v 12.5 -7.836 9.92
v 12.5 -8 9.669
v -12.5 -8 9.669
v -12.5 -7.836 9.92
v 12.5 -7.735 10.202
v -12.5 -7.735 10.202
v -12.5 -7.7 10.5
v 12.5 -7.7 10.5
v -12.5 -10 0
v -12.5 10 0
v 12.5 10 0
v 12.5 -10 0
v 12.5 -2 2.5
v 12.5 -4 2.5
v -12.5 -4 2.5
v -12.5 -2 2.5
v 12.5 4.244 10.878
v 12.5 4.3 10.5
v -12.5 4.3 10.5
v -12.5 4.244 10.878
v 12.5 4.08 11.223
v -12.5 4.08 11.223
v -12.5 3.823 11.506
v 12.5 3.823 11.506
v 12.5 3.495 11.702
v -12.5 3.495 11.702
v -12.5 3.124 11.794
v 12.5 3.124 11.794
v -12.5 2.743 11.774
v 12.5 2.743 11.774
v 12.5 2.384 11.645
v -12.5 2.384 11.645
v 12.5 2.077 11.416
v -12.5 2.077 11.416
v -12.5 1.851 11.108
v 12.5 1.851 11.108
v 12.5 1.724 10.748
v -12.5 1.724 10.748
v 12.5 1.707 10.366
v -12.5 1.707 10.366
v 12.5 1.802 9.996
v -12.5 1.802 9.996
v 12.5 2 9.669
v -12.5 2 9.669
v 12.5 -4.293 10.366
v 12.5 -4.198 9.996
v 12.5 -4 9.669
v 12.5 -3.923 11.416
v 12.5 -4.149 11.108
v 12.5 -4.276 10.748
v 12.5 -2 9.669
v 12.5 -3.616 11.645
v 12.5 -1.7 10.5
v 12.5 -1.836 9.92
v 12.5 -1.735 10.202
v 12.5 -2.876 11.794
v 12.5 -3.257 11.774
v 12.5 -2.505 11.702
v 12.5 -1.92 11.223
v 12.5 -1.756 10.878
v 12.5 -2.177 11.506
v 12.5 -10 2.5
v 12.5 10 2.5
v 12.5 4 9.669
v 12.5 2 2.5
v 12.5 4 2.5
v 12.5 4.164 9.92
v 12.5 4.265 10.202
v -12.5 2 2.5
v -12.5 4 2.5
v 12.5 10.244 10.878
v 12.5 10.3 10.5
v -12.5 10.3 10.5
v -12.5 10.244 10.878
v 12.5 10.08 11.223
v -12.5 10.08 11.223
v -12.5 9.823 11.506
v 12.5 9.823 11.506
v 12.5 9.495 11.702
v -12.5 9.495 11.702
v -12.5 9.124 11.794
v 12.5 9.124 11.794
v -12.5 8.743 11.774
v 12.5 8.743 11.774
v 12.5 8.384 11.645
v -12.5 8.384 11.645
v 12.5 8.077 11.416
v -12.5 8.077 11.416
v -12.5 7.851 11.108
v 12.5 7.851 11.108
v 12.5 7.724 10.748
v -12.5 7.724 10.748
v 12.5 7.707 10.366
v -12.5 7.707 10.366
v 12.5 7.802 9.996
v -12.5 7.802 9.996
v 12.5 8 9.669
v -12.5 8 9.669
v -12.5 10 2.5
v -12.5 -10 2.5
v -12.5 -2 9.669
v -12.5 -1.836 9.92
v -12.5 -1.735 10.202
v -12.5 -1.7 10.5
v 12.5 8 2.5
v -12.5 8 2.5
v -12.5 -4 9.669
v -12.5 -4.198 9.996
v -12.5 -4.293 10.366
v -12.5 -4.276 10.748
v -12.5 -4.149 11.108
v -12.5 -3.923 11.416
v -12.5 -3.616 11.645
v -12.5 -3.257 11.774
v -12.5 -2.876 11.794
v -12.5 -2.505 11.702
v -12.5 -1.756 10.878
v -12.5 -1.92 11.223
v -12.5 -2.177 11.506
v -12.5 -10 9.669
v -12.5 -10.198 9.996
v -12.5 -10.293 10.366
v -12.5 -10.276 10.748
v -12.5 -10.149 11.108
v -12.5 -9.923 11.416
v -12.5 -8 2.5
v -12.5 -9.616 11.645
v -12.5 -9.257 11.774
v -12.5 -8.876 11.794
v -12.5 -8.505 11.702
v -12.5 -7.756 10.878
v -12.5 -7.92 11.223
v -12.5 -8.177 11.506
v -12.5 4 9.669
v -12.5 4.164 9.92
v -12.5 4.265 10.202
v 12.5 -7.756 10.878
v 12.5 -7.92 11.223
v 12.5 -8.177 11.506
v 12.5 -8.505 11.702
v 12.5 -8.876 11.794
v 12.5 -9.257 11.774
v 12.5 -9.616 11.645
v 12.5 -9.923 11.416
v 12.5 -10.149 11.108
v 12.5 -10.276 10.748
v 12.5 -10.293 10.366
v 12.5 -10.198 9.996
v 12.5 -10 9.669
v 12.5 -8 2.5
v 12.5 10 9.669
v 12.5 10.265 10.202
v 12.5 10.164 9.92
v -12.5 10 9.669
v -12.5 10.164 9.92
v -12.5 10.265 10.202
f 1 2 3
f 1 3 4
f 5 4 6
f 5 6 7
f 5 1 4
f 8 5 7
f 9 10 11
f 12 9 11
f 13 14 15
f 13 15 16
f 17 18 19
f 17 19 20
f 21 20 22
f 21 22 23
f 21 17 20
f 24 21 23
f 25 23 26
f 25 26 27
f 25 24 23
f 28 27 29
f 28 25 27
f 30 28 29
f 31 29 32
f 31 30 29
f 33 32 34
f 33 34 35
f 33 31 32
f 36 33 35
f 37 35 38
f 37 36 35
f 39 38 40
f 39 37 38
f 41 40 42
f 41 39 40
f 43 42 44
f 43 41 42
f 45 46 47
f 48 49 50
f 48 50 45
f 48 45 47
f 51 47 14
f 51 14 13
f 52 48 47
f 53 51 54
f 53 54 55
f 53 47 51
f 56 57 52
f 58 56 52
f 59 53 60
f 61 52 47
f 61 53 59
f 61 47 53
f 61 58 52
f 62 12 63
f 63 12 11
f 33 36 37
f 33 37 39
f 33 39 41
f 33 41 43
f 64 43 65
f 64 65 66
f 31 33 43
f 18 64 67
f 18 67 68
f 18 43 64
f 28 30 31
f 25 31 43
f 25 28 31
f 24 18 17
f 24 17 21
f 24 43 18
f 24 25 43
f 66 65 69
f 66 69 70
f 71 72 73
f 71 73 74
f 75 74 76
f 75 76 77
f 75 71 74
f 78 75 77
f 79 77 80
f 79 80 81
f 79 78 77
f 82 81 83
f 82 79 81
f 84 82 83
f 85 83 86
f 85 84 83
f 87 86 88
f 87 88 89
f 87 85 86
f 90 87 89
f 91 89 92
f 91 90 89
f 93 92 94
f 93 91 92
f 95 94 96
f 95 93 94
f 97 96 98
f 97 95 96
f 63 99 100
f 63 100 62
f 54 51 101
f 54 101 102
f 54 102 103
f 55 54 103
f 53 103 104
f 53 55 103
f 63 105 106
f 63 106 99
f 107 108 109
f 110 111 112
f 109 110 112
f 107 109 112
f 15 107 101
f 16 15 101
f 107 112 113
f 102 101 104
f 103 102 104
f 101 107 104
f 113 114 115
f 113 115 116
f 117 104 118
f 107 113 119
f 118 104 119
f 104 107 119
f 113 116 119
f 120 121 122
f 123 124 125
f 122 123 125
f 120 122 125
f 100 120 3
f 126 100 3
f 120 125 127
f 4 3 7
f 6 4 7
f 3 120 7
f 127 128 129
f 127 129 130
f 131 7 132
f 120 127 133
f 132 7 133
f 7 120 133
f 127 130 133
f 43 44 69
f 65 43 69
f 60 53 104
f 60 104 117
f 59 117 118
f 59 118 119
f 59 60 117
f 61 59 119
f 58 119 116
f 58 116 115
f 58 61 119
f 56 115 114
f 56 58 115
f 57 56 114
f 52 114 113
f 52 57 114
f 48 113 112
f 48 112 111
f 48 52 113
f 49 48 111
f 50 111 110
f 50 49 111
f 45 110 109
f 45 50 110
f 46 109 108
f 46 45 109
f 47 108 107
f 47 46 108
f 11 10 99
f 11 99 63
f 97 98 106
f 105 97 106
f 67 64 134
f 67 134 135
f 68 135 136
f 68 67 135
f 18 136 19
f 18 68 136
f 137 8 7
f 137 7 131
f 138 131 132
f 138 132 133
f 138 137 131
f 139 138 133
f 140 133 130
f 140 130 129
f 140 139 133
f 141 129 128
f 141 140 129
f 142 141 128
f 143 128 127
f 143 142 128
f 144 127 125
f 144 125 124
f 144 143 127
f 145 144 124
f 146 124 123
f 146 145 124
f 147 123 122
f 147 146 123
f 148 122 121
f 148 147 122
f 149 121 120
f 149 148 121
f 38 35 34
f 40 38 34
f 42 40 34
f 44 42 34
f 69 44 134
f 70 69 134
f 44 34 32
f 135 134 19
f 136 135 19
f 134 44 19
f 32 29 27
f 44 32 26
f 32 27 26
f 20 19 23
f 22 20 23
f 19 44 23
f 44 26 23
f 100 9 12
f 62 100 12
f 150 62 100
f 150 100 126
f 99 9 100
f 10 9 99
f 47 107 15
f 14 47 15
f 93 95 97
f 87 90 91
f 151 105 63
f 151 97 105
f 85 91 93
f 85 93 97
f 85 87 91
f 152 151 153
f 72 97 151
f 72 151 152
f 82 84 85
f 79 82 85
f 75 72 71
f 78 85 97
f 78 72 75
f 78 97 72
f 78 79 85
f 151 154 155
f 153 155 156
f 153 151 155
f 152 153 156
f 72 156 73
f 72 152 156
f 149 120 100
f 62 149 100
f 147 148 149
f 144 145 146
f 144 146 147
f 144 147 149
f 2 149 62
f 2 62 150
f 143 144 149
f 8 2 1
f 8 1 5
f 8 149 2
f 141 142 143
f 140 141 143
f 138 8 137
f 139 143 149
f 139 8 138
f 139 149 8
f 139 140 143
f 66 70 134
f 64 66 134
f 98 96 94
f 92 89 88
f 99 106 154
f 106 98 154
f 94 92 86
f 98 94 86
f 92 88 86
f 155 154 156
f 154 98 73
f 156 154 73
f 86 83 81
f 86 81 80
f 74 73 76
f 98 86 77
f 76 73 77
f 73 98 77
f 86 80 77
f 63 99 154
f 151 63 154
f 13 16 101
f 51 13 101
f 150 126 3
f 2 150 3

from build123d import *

# Parameters (mm, degrees)
F0_W     = 25
F0_H     = 20
F1_DEPTH = 2.5
F3_DEPTH = 25


with BuildPart() as f1:
    # F0 (on Top) → F1 (new body)
    with BuildSketch(Plane.XY):
        Rectangle(F0_W, F0_H)
    extrude(amount=F1_DEPTH)


with BuildPart() as f3:
    # F2 (on face) → F3 (new body)
    with BuildSketch(Plane.YZ.offset(12.5)):
        with BuildLine():
            Line((-10, 9.6693376137), (-10, 2.5))
            Line((-10, 2.5), (-8, 2.5))
            Line((-8, 2.5), (-8, 9.6693376137))
            ThreePointArc((-8, 9.6693376137), (-9, 9.2), (-10, 9.6693376137))
        make_face()
        with BuildLine():
            ThreePointArc((-7.7, 10.5), (-9.4415880433, 11.7227019261), (-10, 9.6693376137))
            Line((-10, 9.6693376137), (-10, 10.5))
            Line((-10, 10.5), (-8, 10.5))
            Line((-8, 10.5), (-8, 9.6693376137))
            ThreePointArc((-8, 9.6693376137), (-7.7772980739, 10.0584119567), (-7.7, 10.5))
        make_face()
        with BuildLine():
            Line((-10, 10.5), (-10, 9.6693376137))
            ThreePointArc((-10, 9.6693376137), (-9, 9.2), (-8, 9.6693376137))
            Line((-8, 9.6693376137), (-8, 10.5))
            Line((-8, 10.5), (-10, 10.5))
        make_face()
    extrude(amount=-F3_DEPTH)


with BuildPart() as f3b:
    # F2 (on face) → F3, piece 2 (new body)
    with BuildSketch(Plane.YZ.offset(12.5)):
        with BuildLine():
            Line((8, 2.5), (10, 2.5))
            Line((10, 2.5), (10, 9.6693376137))
            ThreePointArc((10, 9.6693376137), (9, 9.2), (8, 9.6693376137))
            Line((8, 9.6693376137), (8, 2.5))
        make_face()
        with BuildLine():
            ThreePointArc((8, 9.6693376137), (9, 9.2), (10, 9.6693376137))
            Line((10, 9.6693376137), (10, 10.5))
            Line((10, 10.5), (8, 10.5))
            Line((8, 10.5), (8, 9.6693376137))
        make_face()
        with BuildLine():
            Line((10, 10.5), (10, 9.6693376137))
            ThreePointArc((10, 9.6693376137), (10.2227019261, 10.0584119567), (10.3, 10.5))
            ThreePointArc((10.3, 10.5), (8.5584119567, 11.7227019261), (8, 9.6693376137))
            Line((8, 9.6693376137), (8, 10.5))
            Line((8, 10.5), (10, 10.5))
        make_face()
    extrude(amount=-F3_DEPTH)


with BuildPart() as f3c:
    # F2 (on face) → F3, piece 3 (new body)
    with BuildSketch(Plane.YZ.offset(12.5)):
        with BuildLine():
            Line((-4, 9.6693376137), (-4, 2.5))
            Line((-4, 2.5), (-2, 2.5))
            Line((-2, 2.5), (-2, 9.6693376137))
            ThreePointArc((-2, 9.6693376137), (-3, 9.2), (-4, 9.6693376137))
        make_face()
        with BuildLine():
            ThreePointArc((-1.7, 10.5), (-3.4415880433, 11.7227019261), (-4, 9.6693376137))
            Line((-4, 9.6693376137), (-4, 10.5))
            Line((-4, 10.5), (-2, 10.5))
            Line((-2, 10.5), (-2, 9.6693376137))
            ThreePointArc((-2, 9.6693376137), (-1.7772980739, 10.0584119567), (-1.7, 10.5))
        make_face()
        with BuildLine():
            Line((-4, 10.5), (-4, 9.6693376137))
            ThreePointArc((-4, 9.6693376137), (-3, 9.2), (-2, 9.6693376137))
            Line((-2, 9.6693376137), (-2, 10.5))
            Line((-2, 10.5), (-4, 10.5))
        make_face()
    extrude(amount=-F3_DEPTH)


with BuildPart() as f3d:
    # F2 (on face) → F3, piece 4 (new body)
    with BuildSketch(Plane.YZ.offset(12.5)):
        with BuildLine():
            Line((2, 9.6693376137), (2, 2.5))
            Line((2, 2.5), (4, 2.5))
            Line((4, 2.5), (4, 9.6693376137))
            ThreePointArc((4, 9.6693376137), (3, 9.2), (2, 9.6693376137))
        make_face()
        with BuildLine():
            ThreePointArc((4.3, 10.5), (2.5584119567, 11.7227019261), (2, 9.6693376137))
            Line((2, 9.6693376137), (2, 10.5))
            Line((2, 10.5), (4, 10.5))
            Line((4, 10.5), (4, 9.6693376137))
            ThreePointArc((4, 9.6693376137), (4.2227019261, 10.0584119567), (4.3, 10.5))
        make_face()
        with BuildLine():
            Line((2, 10.5), (2, 9.6693376137))
            ThreePointArc((2, 9.6693376137), (3, 9.2), (4, 9.6693376137))
            Line((4, 9.6693376137), (4, 10.5))
            Line((4, 10.5), (2, 10.5))
        make_face()
    extrude(amount=-F3_DEPTH)


solid = Compound([f1.part, f3.part, f3b.part, f3c.part, f3d.part])
